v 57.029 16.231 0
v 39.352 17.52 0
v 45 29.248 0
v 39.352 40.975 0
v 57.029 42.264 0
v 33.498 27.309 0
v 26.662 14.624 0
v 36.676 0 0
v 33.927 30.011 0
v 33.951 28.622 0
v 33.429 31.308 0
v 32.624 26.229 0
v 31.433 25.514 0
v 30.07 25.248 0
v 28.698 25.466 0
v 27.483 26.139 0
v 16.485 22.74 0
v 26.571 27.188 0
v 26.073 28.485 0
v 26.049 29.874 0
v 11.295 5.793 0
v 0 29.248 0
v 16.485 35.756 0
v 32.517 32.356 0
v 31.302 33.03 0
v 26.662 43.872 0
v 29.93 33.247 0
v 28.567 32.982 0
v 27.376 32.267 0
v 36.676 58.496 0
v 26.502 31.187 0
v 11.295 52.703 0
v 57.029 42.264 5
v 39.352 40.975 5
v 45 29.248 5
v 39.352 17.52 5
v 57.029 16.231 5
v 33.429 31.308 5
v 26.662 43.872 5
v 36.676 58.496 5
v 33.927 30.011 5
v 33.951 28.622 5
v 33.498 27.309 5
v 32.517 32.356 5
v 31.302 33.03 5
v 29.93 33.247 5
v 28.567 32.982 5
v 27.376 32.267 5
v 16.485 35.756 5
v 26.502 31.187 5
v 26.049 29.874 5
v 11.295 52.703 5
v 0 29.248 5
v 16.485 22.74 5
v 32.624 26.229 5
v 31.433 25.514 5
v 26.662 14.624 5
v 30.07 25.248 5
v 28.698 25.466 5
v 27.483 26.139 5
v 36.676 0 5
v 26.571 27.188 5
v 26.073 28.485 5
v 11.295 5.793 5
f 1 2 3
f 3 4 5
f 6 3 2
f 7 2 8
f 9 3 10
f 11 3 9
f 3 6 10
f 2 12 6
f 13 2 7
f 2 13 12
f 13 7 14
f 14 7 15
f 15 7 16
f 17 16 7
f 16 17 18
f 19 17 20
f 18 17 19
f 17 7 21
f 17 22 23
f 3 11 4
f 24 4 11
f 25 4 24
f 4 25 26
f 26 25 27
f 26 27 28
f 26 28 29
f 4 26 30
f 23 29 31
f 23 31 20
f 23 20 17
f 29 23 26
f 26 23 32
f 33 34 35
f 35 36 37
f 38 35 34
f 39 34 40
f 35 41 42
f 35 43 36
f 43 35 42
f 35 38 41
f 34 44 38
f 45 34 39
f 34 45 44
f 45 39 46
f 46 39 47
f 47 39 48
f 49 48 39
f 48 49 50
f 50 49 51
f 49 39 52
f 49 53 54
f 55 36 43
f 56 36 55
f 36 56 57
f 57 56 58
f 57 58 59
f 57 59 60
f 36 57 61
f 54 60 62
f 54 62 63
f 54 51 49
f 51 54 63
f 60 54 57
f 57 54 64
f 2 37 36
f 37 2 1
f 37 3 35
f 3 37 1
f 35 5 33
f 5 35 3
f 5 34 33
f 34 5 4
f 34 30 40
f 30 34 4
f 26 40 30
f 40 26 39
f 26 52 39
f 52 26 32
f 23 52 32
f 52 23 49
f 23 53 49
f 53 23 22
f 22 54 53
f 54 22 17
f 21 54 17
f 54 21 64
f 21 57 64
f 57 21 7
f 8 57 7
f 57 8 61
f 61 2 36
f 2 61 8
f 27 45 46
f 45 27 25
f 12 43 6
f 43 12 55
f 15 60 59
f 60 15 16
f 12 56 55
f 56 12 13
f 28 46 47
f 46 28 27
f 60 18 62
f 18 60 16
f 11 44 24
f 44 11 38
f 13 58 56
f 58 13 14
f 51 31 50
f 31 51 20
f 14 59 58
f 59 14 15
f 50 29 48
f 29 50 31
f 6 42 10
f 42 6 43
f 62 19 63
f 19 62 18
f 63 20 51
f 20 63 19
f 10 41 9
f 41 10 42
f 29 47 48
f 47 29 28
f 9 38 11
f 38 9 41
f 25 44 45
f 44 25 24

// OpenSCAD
$fn = 32;

// ----------------------------------------------------------------------
// Star wheel: 7-point star, R30
// ----------------------------------------------------------------------

// --- parameters (mm) ---
n_points = 7;             // number of points / teeth
r_out = 30;               // tip radius
r_in = 15;                // root radius
bore_r = 4;               // centre bore radius
plate_t = 5;              // plate thickness, Z (extrusion height)
bore_d = 8;               // centre bore diameter

profile = [[0, 29.248], [16.485, 22.74], [11.295, 5.793], [26.662, 14.624], [36.676, 0], [39.352, 17.52], [57.029, 16.231], [45, 29.248], [57.029, 42.264], [39.352, 40.975], [36.676, 58.496], [26.662, 43.872], [11.295, 52.703], [16.485, 35.756]];  // primary outline, 14 points, counter clockwise
void_1 = [[33.927, 30.011], [33.429, 31.308], [32.517, 32.356], [31.302, 33.03], [29.93, 33.247], [28.567, 32.982], [27.376, 32.267], [26.502, 31.187], [26.049, 29.874], [26.073, 28.485], [26.571, 27.188], [27.483, 26.139], [28.698, 25.466], [30.07, 25.248], [31.433, 25.514], [32.624, 26.229], [33.498, 27.309], [33.951, 28.622]];  // centre bore, 18 points

// --- the one profile operation ---
difference() {
  linear_extrude(height = plate_t) polygon(points = profile);
  translate([0, 0, -1])
    linear_extrude(height = plate_t + 2) polygon(points = void_1);
}
